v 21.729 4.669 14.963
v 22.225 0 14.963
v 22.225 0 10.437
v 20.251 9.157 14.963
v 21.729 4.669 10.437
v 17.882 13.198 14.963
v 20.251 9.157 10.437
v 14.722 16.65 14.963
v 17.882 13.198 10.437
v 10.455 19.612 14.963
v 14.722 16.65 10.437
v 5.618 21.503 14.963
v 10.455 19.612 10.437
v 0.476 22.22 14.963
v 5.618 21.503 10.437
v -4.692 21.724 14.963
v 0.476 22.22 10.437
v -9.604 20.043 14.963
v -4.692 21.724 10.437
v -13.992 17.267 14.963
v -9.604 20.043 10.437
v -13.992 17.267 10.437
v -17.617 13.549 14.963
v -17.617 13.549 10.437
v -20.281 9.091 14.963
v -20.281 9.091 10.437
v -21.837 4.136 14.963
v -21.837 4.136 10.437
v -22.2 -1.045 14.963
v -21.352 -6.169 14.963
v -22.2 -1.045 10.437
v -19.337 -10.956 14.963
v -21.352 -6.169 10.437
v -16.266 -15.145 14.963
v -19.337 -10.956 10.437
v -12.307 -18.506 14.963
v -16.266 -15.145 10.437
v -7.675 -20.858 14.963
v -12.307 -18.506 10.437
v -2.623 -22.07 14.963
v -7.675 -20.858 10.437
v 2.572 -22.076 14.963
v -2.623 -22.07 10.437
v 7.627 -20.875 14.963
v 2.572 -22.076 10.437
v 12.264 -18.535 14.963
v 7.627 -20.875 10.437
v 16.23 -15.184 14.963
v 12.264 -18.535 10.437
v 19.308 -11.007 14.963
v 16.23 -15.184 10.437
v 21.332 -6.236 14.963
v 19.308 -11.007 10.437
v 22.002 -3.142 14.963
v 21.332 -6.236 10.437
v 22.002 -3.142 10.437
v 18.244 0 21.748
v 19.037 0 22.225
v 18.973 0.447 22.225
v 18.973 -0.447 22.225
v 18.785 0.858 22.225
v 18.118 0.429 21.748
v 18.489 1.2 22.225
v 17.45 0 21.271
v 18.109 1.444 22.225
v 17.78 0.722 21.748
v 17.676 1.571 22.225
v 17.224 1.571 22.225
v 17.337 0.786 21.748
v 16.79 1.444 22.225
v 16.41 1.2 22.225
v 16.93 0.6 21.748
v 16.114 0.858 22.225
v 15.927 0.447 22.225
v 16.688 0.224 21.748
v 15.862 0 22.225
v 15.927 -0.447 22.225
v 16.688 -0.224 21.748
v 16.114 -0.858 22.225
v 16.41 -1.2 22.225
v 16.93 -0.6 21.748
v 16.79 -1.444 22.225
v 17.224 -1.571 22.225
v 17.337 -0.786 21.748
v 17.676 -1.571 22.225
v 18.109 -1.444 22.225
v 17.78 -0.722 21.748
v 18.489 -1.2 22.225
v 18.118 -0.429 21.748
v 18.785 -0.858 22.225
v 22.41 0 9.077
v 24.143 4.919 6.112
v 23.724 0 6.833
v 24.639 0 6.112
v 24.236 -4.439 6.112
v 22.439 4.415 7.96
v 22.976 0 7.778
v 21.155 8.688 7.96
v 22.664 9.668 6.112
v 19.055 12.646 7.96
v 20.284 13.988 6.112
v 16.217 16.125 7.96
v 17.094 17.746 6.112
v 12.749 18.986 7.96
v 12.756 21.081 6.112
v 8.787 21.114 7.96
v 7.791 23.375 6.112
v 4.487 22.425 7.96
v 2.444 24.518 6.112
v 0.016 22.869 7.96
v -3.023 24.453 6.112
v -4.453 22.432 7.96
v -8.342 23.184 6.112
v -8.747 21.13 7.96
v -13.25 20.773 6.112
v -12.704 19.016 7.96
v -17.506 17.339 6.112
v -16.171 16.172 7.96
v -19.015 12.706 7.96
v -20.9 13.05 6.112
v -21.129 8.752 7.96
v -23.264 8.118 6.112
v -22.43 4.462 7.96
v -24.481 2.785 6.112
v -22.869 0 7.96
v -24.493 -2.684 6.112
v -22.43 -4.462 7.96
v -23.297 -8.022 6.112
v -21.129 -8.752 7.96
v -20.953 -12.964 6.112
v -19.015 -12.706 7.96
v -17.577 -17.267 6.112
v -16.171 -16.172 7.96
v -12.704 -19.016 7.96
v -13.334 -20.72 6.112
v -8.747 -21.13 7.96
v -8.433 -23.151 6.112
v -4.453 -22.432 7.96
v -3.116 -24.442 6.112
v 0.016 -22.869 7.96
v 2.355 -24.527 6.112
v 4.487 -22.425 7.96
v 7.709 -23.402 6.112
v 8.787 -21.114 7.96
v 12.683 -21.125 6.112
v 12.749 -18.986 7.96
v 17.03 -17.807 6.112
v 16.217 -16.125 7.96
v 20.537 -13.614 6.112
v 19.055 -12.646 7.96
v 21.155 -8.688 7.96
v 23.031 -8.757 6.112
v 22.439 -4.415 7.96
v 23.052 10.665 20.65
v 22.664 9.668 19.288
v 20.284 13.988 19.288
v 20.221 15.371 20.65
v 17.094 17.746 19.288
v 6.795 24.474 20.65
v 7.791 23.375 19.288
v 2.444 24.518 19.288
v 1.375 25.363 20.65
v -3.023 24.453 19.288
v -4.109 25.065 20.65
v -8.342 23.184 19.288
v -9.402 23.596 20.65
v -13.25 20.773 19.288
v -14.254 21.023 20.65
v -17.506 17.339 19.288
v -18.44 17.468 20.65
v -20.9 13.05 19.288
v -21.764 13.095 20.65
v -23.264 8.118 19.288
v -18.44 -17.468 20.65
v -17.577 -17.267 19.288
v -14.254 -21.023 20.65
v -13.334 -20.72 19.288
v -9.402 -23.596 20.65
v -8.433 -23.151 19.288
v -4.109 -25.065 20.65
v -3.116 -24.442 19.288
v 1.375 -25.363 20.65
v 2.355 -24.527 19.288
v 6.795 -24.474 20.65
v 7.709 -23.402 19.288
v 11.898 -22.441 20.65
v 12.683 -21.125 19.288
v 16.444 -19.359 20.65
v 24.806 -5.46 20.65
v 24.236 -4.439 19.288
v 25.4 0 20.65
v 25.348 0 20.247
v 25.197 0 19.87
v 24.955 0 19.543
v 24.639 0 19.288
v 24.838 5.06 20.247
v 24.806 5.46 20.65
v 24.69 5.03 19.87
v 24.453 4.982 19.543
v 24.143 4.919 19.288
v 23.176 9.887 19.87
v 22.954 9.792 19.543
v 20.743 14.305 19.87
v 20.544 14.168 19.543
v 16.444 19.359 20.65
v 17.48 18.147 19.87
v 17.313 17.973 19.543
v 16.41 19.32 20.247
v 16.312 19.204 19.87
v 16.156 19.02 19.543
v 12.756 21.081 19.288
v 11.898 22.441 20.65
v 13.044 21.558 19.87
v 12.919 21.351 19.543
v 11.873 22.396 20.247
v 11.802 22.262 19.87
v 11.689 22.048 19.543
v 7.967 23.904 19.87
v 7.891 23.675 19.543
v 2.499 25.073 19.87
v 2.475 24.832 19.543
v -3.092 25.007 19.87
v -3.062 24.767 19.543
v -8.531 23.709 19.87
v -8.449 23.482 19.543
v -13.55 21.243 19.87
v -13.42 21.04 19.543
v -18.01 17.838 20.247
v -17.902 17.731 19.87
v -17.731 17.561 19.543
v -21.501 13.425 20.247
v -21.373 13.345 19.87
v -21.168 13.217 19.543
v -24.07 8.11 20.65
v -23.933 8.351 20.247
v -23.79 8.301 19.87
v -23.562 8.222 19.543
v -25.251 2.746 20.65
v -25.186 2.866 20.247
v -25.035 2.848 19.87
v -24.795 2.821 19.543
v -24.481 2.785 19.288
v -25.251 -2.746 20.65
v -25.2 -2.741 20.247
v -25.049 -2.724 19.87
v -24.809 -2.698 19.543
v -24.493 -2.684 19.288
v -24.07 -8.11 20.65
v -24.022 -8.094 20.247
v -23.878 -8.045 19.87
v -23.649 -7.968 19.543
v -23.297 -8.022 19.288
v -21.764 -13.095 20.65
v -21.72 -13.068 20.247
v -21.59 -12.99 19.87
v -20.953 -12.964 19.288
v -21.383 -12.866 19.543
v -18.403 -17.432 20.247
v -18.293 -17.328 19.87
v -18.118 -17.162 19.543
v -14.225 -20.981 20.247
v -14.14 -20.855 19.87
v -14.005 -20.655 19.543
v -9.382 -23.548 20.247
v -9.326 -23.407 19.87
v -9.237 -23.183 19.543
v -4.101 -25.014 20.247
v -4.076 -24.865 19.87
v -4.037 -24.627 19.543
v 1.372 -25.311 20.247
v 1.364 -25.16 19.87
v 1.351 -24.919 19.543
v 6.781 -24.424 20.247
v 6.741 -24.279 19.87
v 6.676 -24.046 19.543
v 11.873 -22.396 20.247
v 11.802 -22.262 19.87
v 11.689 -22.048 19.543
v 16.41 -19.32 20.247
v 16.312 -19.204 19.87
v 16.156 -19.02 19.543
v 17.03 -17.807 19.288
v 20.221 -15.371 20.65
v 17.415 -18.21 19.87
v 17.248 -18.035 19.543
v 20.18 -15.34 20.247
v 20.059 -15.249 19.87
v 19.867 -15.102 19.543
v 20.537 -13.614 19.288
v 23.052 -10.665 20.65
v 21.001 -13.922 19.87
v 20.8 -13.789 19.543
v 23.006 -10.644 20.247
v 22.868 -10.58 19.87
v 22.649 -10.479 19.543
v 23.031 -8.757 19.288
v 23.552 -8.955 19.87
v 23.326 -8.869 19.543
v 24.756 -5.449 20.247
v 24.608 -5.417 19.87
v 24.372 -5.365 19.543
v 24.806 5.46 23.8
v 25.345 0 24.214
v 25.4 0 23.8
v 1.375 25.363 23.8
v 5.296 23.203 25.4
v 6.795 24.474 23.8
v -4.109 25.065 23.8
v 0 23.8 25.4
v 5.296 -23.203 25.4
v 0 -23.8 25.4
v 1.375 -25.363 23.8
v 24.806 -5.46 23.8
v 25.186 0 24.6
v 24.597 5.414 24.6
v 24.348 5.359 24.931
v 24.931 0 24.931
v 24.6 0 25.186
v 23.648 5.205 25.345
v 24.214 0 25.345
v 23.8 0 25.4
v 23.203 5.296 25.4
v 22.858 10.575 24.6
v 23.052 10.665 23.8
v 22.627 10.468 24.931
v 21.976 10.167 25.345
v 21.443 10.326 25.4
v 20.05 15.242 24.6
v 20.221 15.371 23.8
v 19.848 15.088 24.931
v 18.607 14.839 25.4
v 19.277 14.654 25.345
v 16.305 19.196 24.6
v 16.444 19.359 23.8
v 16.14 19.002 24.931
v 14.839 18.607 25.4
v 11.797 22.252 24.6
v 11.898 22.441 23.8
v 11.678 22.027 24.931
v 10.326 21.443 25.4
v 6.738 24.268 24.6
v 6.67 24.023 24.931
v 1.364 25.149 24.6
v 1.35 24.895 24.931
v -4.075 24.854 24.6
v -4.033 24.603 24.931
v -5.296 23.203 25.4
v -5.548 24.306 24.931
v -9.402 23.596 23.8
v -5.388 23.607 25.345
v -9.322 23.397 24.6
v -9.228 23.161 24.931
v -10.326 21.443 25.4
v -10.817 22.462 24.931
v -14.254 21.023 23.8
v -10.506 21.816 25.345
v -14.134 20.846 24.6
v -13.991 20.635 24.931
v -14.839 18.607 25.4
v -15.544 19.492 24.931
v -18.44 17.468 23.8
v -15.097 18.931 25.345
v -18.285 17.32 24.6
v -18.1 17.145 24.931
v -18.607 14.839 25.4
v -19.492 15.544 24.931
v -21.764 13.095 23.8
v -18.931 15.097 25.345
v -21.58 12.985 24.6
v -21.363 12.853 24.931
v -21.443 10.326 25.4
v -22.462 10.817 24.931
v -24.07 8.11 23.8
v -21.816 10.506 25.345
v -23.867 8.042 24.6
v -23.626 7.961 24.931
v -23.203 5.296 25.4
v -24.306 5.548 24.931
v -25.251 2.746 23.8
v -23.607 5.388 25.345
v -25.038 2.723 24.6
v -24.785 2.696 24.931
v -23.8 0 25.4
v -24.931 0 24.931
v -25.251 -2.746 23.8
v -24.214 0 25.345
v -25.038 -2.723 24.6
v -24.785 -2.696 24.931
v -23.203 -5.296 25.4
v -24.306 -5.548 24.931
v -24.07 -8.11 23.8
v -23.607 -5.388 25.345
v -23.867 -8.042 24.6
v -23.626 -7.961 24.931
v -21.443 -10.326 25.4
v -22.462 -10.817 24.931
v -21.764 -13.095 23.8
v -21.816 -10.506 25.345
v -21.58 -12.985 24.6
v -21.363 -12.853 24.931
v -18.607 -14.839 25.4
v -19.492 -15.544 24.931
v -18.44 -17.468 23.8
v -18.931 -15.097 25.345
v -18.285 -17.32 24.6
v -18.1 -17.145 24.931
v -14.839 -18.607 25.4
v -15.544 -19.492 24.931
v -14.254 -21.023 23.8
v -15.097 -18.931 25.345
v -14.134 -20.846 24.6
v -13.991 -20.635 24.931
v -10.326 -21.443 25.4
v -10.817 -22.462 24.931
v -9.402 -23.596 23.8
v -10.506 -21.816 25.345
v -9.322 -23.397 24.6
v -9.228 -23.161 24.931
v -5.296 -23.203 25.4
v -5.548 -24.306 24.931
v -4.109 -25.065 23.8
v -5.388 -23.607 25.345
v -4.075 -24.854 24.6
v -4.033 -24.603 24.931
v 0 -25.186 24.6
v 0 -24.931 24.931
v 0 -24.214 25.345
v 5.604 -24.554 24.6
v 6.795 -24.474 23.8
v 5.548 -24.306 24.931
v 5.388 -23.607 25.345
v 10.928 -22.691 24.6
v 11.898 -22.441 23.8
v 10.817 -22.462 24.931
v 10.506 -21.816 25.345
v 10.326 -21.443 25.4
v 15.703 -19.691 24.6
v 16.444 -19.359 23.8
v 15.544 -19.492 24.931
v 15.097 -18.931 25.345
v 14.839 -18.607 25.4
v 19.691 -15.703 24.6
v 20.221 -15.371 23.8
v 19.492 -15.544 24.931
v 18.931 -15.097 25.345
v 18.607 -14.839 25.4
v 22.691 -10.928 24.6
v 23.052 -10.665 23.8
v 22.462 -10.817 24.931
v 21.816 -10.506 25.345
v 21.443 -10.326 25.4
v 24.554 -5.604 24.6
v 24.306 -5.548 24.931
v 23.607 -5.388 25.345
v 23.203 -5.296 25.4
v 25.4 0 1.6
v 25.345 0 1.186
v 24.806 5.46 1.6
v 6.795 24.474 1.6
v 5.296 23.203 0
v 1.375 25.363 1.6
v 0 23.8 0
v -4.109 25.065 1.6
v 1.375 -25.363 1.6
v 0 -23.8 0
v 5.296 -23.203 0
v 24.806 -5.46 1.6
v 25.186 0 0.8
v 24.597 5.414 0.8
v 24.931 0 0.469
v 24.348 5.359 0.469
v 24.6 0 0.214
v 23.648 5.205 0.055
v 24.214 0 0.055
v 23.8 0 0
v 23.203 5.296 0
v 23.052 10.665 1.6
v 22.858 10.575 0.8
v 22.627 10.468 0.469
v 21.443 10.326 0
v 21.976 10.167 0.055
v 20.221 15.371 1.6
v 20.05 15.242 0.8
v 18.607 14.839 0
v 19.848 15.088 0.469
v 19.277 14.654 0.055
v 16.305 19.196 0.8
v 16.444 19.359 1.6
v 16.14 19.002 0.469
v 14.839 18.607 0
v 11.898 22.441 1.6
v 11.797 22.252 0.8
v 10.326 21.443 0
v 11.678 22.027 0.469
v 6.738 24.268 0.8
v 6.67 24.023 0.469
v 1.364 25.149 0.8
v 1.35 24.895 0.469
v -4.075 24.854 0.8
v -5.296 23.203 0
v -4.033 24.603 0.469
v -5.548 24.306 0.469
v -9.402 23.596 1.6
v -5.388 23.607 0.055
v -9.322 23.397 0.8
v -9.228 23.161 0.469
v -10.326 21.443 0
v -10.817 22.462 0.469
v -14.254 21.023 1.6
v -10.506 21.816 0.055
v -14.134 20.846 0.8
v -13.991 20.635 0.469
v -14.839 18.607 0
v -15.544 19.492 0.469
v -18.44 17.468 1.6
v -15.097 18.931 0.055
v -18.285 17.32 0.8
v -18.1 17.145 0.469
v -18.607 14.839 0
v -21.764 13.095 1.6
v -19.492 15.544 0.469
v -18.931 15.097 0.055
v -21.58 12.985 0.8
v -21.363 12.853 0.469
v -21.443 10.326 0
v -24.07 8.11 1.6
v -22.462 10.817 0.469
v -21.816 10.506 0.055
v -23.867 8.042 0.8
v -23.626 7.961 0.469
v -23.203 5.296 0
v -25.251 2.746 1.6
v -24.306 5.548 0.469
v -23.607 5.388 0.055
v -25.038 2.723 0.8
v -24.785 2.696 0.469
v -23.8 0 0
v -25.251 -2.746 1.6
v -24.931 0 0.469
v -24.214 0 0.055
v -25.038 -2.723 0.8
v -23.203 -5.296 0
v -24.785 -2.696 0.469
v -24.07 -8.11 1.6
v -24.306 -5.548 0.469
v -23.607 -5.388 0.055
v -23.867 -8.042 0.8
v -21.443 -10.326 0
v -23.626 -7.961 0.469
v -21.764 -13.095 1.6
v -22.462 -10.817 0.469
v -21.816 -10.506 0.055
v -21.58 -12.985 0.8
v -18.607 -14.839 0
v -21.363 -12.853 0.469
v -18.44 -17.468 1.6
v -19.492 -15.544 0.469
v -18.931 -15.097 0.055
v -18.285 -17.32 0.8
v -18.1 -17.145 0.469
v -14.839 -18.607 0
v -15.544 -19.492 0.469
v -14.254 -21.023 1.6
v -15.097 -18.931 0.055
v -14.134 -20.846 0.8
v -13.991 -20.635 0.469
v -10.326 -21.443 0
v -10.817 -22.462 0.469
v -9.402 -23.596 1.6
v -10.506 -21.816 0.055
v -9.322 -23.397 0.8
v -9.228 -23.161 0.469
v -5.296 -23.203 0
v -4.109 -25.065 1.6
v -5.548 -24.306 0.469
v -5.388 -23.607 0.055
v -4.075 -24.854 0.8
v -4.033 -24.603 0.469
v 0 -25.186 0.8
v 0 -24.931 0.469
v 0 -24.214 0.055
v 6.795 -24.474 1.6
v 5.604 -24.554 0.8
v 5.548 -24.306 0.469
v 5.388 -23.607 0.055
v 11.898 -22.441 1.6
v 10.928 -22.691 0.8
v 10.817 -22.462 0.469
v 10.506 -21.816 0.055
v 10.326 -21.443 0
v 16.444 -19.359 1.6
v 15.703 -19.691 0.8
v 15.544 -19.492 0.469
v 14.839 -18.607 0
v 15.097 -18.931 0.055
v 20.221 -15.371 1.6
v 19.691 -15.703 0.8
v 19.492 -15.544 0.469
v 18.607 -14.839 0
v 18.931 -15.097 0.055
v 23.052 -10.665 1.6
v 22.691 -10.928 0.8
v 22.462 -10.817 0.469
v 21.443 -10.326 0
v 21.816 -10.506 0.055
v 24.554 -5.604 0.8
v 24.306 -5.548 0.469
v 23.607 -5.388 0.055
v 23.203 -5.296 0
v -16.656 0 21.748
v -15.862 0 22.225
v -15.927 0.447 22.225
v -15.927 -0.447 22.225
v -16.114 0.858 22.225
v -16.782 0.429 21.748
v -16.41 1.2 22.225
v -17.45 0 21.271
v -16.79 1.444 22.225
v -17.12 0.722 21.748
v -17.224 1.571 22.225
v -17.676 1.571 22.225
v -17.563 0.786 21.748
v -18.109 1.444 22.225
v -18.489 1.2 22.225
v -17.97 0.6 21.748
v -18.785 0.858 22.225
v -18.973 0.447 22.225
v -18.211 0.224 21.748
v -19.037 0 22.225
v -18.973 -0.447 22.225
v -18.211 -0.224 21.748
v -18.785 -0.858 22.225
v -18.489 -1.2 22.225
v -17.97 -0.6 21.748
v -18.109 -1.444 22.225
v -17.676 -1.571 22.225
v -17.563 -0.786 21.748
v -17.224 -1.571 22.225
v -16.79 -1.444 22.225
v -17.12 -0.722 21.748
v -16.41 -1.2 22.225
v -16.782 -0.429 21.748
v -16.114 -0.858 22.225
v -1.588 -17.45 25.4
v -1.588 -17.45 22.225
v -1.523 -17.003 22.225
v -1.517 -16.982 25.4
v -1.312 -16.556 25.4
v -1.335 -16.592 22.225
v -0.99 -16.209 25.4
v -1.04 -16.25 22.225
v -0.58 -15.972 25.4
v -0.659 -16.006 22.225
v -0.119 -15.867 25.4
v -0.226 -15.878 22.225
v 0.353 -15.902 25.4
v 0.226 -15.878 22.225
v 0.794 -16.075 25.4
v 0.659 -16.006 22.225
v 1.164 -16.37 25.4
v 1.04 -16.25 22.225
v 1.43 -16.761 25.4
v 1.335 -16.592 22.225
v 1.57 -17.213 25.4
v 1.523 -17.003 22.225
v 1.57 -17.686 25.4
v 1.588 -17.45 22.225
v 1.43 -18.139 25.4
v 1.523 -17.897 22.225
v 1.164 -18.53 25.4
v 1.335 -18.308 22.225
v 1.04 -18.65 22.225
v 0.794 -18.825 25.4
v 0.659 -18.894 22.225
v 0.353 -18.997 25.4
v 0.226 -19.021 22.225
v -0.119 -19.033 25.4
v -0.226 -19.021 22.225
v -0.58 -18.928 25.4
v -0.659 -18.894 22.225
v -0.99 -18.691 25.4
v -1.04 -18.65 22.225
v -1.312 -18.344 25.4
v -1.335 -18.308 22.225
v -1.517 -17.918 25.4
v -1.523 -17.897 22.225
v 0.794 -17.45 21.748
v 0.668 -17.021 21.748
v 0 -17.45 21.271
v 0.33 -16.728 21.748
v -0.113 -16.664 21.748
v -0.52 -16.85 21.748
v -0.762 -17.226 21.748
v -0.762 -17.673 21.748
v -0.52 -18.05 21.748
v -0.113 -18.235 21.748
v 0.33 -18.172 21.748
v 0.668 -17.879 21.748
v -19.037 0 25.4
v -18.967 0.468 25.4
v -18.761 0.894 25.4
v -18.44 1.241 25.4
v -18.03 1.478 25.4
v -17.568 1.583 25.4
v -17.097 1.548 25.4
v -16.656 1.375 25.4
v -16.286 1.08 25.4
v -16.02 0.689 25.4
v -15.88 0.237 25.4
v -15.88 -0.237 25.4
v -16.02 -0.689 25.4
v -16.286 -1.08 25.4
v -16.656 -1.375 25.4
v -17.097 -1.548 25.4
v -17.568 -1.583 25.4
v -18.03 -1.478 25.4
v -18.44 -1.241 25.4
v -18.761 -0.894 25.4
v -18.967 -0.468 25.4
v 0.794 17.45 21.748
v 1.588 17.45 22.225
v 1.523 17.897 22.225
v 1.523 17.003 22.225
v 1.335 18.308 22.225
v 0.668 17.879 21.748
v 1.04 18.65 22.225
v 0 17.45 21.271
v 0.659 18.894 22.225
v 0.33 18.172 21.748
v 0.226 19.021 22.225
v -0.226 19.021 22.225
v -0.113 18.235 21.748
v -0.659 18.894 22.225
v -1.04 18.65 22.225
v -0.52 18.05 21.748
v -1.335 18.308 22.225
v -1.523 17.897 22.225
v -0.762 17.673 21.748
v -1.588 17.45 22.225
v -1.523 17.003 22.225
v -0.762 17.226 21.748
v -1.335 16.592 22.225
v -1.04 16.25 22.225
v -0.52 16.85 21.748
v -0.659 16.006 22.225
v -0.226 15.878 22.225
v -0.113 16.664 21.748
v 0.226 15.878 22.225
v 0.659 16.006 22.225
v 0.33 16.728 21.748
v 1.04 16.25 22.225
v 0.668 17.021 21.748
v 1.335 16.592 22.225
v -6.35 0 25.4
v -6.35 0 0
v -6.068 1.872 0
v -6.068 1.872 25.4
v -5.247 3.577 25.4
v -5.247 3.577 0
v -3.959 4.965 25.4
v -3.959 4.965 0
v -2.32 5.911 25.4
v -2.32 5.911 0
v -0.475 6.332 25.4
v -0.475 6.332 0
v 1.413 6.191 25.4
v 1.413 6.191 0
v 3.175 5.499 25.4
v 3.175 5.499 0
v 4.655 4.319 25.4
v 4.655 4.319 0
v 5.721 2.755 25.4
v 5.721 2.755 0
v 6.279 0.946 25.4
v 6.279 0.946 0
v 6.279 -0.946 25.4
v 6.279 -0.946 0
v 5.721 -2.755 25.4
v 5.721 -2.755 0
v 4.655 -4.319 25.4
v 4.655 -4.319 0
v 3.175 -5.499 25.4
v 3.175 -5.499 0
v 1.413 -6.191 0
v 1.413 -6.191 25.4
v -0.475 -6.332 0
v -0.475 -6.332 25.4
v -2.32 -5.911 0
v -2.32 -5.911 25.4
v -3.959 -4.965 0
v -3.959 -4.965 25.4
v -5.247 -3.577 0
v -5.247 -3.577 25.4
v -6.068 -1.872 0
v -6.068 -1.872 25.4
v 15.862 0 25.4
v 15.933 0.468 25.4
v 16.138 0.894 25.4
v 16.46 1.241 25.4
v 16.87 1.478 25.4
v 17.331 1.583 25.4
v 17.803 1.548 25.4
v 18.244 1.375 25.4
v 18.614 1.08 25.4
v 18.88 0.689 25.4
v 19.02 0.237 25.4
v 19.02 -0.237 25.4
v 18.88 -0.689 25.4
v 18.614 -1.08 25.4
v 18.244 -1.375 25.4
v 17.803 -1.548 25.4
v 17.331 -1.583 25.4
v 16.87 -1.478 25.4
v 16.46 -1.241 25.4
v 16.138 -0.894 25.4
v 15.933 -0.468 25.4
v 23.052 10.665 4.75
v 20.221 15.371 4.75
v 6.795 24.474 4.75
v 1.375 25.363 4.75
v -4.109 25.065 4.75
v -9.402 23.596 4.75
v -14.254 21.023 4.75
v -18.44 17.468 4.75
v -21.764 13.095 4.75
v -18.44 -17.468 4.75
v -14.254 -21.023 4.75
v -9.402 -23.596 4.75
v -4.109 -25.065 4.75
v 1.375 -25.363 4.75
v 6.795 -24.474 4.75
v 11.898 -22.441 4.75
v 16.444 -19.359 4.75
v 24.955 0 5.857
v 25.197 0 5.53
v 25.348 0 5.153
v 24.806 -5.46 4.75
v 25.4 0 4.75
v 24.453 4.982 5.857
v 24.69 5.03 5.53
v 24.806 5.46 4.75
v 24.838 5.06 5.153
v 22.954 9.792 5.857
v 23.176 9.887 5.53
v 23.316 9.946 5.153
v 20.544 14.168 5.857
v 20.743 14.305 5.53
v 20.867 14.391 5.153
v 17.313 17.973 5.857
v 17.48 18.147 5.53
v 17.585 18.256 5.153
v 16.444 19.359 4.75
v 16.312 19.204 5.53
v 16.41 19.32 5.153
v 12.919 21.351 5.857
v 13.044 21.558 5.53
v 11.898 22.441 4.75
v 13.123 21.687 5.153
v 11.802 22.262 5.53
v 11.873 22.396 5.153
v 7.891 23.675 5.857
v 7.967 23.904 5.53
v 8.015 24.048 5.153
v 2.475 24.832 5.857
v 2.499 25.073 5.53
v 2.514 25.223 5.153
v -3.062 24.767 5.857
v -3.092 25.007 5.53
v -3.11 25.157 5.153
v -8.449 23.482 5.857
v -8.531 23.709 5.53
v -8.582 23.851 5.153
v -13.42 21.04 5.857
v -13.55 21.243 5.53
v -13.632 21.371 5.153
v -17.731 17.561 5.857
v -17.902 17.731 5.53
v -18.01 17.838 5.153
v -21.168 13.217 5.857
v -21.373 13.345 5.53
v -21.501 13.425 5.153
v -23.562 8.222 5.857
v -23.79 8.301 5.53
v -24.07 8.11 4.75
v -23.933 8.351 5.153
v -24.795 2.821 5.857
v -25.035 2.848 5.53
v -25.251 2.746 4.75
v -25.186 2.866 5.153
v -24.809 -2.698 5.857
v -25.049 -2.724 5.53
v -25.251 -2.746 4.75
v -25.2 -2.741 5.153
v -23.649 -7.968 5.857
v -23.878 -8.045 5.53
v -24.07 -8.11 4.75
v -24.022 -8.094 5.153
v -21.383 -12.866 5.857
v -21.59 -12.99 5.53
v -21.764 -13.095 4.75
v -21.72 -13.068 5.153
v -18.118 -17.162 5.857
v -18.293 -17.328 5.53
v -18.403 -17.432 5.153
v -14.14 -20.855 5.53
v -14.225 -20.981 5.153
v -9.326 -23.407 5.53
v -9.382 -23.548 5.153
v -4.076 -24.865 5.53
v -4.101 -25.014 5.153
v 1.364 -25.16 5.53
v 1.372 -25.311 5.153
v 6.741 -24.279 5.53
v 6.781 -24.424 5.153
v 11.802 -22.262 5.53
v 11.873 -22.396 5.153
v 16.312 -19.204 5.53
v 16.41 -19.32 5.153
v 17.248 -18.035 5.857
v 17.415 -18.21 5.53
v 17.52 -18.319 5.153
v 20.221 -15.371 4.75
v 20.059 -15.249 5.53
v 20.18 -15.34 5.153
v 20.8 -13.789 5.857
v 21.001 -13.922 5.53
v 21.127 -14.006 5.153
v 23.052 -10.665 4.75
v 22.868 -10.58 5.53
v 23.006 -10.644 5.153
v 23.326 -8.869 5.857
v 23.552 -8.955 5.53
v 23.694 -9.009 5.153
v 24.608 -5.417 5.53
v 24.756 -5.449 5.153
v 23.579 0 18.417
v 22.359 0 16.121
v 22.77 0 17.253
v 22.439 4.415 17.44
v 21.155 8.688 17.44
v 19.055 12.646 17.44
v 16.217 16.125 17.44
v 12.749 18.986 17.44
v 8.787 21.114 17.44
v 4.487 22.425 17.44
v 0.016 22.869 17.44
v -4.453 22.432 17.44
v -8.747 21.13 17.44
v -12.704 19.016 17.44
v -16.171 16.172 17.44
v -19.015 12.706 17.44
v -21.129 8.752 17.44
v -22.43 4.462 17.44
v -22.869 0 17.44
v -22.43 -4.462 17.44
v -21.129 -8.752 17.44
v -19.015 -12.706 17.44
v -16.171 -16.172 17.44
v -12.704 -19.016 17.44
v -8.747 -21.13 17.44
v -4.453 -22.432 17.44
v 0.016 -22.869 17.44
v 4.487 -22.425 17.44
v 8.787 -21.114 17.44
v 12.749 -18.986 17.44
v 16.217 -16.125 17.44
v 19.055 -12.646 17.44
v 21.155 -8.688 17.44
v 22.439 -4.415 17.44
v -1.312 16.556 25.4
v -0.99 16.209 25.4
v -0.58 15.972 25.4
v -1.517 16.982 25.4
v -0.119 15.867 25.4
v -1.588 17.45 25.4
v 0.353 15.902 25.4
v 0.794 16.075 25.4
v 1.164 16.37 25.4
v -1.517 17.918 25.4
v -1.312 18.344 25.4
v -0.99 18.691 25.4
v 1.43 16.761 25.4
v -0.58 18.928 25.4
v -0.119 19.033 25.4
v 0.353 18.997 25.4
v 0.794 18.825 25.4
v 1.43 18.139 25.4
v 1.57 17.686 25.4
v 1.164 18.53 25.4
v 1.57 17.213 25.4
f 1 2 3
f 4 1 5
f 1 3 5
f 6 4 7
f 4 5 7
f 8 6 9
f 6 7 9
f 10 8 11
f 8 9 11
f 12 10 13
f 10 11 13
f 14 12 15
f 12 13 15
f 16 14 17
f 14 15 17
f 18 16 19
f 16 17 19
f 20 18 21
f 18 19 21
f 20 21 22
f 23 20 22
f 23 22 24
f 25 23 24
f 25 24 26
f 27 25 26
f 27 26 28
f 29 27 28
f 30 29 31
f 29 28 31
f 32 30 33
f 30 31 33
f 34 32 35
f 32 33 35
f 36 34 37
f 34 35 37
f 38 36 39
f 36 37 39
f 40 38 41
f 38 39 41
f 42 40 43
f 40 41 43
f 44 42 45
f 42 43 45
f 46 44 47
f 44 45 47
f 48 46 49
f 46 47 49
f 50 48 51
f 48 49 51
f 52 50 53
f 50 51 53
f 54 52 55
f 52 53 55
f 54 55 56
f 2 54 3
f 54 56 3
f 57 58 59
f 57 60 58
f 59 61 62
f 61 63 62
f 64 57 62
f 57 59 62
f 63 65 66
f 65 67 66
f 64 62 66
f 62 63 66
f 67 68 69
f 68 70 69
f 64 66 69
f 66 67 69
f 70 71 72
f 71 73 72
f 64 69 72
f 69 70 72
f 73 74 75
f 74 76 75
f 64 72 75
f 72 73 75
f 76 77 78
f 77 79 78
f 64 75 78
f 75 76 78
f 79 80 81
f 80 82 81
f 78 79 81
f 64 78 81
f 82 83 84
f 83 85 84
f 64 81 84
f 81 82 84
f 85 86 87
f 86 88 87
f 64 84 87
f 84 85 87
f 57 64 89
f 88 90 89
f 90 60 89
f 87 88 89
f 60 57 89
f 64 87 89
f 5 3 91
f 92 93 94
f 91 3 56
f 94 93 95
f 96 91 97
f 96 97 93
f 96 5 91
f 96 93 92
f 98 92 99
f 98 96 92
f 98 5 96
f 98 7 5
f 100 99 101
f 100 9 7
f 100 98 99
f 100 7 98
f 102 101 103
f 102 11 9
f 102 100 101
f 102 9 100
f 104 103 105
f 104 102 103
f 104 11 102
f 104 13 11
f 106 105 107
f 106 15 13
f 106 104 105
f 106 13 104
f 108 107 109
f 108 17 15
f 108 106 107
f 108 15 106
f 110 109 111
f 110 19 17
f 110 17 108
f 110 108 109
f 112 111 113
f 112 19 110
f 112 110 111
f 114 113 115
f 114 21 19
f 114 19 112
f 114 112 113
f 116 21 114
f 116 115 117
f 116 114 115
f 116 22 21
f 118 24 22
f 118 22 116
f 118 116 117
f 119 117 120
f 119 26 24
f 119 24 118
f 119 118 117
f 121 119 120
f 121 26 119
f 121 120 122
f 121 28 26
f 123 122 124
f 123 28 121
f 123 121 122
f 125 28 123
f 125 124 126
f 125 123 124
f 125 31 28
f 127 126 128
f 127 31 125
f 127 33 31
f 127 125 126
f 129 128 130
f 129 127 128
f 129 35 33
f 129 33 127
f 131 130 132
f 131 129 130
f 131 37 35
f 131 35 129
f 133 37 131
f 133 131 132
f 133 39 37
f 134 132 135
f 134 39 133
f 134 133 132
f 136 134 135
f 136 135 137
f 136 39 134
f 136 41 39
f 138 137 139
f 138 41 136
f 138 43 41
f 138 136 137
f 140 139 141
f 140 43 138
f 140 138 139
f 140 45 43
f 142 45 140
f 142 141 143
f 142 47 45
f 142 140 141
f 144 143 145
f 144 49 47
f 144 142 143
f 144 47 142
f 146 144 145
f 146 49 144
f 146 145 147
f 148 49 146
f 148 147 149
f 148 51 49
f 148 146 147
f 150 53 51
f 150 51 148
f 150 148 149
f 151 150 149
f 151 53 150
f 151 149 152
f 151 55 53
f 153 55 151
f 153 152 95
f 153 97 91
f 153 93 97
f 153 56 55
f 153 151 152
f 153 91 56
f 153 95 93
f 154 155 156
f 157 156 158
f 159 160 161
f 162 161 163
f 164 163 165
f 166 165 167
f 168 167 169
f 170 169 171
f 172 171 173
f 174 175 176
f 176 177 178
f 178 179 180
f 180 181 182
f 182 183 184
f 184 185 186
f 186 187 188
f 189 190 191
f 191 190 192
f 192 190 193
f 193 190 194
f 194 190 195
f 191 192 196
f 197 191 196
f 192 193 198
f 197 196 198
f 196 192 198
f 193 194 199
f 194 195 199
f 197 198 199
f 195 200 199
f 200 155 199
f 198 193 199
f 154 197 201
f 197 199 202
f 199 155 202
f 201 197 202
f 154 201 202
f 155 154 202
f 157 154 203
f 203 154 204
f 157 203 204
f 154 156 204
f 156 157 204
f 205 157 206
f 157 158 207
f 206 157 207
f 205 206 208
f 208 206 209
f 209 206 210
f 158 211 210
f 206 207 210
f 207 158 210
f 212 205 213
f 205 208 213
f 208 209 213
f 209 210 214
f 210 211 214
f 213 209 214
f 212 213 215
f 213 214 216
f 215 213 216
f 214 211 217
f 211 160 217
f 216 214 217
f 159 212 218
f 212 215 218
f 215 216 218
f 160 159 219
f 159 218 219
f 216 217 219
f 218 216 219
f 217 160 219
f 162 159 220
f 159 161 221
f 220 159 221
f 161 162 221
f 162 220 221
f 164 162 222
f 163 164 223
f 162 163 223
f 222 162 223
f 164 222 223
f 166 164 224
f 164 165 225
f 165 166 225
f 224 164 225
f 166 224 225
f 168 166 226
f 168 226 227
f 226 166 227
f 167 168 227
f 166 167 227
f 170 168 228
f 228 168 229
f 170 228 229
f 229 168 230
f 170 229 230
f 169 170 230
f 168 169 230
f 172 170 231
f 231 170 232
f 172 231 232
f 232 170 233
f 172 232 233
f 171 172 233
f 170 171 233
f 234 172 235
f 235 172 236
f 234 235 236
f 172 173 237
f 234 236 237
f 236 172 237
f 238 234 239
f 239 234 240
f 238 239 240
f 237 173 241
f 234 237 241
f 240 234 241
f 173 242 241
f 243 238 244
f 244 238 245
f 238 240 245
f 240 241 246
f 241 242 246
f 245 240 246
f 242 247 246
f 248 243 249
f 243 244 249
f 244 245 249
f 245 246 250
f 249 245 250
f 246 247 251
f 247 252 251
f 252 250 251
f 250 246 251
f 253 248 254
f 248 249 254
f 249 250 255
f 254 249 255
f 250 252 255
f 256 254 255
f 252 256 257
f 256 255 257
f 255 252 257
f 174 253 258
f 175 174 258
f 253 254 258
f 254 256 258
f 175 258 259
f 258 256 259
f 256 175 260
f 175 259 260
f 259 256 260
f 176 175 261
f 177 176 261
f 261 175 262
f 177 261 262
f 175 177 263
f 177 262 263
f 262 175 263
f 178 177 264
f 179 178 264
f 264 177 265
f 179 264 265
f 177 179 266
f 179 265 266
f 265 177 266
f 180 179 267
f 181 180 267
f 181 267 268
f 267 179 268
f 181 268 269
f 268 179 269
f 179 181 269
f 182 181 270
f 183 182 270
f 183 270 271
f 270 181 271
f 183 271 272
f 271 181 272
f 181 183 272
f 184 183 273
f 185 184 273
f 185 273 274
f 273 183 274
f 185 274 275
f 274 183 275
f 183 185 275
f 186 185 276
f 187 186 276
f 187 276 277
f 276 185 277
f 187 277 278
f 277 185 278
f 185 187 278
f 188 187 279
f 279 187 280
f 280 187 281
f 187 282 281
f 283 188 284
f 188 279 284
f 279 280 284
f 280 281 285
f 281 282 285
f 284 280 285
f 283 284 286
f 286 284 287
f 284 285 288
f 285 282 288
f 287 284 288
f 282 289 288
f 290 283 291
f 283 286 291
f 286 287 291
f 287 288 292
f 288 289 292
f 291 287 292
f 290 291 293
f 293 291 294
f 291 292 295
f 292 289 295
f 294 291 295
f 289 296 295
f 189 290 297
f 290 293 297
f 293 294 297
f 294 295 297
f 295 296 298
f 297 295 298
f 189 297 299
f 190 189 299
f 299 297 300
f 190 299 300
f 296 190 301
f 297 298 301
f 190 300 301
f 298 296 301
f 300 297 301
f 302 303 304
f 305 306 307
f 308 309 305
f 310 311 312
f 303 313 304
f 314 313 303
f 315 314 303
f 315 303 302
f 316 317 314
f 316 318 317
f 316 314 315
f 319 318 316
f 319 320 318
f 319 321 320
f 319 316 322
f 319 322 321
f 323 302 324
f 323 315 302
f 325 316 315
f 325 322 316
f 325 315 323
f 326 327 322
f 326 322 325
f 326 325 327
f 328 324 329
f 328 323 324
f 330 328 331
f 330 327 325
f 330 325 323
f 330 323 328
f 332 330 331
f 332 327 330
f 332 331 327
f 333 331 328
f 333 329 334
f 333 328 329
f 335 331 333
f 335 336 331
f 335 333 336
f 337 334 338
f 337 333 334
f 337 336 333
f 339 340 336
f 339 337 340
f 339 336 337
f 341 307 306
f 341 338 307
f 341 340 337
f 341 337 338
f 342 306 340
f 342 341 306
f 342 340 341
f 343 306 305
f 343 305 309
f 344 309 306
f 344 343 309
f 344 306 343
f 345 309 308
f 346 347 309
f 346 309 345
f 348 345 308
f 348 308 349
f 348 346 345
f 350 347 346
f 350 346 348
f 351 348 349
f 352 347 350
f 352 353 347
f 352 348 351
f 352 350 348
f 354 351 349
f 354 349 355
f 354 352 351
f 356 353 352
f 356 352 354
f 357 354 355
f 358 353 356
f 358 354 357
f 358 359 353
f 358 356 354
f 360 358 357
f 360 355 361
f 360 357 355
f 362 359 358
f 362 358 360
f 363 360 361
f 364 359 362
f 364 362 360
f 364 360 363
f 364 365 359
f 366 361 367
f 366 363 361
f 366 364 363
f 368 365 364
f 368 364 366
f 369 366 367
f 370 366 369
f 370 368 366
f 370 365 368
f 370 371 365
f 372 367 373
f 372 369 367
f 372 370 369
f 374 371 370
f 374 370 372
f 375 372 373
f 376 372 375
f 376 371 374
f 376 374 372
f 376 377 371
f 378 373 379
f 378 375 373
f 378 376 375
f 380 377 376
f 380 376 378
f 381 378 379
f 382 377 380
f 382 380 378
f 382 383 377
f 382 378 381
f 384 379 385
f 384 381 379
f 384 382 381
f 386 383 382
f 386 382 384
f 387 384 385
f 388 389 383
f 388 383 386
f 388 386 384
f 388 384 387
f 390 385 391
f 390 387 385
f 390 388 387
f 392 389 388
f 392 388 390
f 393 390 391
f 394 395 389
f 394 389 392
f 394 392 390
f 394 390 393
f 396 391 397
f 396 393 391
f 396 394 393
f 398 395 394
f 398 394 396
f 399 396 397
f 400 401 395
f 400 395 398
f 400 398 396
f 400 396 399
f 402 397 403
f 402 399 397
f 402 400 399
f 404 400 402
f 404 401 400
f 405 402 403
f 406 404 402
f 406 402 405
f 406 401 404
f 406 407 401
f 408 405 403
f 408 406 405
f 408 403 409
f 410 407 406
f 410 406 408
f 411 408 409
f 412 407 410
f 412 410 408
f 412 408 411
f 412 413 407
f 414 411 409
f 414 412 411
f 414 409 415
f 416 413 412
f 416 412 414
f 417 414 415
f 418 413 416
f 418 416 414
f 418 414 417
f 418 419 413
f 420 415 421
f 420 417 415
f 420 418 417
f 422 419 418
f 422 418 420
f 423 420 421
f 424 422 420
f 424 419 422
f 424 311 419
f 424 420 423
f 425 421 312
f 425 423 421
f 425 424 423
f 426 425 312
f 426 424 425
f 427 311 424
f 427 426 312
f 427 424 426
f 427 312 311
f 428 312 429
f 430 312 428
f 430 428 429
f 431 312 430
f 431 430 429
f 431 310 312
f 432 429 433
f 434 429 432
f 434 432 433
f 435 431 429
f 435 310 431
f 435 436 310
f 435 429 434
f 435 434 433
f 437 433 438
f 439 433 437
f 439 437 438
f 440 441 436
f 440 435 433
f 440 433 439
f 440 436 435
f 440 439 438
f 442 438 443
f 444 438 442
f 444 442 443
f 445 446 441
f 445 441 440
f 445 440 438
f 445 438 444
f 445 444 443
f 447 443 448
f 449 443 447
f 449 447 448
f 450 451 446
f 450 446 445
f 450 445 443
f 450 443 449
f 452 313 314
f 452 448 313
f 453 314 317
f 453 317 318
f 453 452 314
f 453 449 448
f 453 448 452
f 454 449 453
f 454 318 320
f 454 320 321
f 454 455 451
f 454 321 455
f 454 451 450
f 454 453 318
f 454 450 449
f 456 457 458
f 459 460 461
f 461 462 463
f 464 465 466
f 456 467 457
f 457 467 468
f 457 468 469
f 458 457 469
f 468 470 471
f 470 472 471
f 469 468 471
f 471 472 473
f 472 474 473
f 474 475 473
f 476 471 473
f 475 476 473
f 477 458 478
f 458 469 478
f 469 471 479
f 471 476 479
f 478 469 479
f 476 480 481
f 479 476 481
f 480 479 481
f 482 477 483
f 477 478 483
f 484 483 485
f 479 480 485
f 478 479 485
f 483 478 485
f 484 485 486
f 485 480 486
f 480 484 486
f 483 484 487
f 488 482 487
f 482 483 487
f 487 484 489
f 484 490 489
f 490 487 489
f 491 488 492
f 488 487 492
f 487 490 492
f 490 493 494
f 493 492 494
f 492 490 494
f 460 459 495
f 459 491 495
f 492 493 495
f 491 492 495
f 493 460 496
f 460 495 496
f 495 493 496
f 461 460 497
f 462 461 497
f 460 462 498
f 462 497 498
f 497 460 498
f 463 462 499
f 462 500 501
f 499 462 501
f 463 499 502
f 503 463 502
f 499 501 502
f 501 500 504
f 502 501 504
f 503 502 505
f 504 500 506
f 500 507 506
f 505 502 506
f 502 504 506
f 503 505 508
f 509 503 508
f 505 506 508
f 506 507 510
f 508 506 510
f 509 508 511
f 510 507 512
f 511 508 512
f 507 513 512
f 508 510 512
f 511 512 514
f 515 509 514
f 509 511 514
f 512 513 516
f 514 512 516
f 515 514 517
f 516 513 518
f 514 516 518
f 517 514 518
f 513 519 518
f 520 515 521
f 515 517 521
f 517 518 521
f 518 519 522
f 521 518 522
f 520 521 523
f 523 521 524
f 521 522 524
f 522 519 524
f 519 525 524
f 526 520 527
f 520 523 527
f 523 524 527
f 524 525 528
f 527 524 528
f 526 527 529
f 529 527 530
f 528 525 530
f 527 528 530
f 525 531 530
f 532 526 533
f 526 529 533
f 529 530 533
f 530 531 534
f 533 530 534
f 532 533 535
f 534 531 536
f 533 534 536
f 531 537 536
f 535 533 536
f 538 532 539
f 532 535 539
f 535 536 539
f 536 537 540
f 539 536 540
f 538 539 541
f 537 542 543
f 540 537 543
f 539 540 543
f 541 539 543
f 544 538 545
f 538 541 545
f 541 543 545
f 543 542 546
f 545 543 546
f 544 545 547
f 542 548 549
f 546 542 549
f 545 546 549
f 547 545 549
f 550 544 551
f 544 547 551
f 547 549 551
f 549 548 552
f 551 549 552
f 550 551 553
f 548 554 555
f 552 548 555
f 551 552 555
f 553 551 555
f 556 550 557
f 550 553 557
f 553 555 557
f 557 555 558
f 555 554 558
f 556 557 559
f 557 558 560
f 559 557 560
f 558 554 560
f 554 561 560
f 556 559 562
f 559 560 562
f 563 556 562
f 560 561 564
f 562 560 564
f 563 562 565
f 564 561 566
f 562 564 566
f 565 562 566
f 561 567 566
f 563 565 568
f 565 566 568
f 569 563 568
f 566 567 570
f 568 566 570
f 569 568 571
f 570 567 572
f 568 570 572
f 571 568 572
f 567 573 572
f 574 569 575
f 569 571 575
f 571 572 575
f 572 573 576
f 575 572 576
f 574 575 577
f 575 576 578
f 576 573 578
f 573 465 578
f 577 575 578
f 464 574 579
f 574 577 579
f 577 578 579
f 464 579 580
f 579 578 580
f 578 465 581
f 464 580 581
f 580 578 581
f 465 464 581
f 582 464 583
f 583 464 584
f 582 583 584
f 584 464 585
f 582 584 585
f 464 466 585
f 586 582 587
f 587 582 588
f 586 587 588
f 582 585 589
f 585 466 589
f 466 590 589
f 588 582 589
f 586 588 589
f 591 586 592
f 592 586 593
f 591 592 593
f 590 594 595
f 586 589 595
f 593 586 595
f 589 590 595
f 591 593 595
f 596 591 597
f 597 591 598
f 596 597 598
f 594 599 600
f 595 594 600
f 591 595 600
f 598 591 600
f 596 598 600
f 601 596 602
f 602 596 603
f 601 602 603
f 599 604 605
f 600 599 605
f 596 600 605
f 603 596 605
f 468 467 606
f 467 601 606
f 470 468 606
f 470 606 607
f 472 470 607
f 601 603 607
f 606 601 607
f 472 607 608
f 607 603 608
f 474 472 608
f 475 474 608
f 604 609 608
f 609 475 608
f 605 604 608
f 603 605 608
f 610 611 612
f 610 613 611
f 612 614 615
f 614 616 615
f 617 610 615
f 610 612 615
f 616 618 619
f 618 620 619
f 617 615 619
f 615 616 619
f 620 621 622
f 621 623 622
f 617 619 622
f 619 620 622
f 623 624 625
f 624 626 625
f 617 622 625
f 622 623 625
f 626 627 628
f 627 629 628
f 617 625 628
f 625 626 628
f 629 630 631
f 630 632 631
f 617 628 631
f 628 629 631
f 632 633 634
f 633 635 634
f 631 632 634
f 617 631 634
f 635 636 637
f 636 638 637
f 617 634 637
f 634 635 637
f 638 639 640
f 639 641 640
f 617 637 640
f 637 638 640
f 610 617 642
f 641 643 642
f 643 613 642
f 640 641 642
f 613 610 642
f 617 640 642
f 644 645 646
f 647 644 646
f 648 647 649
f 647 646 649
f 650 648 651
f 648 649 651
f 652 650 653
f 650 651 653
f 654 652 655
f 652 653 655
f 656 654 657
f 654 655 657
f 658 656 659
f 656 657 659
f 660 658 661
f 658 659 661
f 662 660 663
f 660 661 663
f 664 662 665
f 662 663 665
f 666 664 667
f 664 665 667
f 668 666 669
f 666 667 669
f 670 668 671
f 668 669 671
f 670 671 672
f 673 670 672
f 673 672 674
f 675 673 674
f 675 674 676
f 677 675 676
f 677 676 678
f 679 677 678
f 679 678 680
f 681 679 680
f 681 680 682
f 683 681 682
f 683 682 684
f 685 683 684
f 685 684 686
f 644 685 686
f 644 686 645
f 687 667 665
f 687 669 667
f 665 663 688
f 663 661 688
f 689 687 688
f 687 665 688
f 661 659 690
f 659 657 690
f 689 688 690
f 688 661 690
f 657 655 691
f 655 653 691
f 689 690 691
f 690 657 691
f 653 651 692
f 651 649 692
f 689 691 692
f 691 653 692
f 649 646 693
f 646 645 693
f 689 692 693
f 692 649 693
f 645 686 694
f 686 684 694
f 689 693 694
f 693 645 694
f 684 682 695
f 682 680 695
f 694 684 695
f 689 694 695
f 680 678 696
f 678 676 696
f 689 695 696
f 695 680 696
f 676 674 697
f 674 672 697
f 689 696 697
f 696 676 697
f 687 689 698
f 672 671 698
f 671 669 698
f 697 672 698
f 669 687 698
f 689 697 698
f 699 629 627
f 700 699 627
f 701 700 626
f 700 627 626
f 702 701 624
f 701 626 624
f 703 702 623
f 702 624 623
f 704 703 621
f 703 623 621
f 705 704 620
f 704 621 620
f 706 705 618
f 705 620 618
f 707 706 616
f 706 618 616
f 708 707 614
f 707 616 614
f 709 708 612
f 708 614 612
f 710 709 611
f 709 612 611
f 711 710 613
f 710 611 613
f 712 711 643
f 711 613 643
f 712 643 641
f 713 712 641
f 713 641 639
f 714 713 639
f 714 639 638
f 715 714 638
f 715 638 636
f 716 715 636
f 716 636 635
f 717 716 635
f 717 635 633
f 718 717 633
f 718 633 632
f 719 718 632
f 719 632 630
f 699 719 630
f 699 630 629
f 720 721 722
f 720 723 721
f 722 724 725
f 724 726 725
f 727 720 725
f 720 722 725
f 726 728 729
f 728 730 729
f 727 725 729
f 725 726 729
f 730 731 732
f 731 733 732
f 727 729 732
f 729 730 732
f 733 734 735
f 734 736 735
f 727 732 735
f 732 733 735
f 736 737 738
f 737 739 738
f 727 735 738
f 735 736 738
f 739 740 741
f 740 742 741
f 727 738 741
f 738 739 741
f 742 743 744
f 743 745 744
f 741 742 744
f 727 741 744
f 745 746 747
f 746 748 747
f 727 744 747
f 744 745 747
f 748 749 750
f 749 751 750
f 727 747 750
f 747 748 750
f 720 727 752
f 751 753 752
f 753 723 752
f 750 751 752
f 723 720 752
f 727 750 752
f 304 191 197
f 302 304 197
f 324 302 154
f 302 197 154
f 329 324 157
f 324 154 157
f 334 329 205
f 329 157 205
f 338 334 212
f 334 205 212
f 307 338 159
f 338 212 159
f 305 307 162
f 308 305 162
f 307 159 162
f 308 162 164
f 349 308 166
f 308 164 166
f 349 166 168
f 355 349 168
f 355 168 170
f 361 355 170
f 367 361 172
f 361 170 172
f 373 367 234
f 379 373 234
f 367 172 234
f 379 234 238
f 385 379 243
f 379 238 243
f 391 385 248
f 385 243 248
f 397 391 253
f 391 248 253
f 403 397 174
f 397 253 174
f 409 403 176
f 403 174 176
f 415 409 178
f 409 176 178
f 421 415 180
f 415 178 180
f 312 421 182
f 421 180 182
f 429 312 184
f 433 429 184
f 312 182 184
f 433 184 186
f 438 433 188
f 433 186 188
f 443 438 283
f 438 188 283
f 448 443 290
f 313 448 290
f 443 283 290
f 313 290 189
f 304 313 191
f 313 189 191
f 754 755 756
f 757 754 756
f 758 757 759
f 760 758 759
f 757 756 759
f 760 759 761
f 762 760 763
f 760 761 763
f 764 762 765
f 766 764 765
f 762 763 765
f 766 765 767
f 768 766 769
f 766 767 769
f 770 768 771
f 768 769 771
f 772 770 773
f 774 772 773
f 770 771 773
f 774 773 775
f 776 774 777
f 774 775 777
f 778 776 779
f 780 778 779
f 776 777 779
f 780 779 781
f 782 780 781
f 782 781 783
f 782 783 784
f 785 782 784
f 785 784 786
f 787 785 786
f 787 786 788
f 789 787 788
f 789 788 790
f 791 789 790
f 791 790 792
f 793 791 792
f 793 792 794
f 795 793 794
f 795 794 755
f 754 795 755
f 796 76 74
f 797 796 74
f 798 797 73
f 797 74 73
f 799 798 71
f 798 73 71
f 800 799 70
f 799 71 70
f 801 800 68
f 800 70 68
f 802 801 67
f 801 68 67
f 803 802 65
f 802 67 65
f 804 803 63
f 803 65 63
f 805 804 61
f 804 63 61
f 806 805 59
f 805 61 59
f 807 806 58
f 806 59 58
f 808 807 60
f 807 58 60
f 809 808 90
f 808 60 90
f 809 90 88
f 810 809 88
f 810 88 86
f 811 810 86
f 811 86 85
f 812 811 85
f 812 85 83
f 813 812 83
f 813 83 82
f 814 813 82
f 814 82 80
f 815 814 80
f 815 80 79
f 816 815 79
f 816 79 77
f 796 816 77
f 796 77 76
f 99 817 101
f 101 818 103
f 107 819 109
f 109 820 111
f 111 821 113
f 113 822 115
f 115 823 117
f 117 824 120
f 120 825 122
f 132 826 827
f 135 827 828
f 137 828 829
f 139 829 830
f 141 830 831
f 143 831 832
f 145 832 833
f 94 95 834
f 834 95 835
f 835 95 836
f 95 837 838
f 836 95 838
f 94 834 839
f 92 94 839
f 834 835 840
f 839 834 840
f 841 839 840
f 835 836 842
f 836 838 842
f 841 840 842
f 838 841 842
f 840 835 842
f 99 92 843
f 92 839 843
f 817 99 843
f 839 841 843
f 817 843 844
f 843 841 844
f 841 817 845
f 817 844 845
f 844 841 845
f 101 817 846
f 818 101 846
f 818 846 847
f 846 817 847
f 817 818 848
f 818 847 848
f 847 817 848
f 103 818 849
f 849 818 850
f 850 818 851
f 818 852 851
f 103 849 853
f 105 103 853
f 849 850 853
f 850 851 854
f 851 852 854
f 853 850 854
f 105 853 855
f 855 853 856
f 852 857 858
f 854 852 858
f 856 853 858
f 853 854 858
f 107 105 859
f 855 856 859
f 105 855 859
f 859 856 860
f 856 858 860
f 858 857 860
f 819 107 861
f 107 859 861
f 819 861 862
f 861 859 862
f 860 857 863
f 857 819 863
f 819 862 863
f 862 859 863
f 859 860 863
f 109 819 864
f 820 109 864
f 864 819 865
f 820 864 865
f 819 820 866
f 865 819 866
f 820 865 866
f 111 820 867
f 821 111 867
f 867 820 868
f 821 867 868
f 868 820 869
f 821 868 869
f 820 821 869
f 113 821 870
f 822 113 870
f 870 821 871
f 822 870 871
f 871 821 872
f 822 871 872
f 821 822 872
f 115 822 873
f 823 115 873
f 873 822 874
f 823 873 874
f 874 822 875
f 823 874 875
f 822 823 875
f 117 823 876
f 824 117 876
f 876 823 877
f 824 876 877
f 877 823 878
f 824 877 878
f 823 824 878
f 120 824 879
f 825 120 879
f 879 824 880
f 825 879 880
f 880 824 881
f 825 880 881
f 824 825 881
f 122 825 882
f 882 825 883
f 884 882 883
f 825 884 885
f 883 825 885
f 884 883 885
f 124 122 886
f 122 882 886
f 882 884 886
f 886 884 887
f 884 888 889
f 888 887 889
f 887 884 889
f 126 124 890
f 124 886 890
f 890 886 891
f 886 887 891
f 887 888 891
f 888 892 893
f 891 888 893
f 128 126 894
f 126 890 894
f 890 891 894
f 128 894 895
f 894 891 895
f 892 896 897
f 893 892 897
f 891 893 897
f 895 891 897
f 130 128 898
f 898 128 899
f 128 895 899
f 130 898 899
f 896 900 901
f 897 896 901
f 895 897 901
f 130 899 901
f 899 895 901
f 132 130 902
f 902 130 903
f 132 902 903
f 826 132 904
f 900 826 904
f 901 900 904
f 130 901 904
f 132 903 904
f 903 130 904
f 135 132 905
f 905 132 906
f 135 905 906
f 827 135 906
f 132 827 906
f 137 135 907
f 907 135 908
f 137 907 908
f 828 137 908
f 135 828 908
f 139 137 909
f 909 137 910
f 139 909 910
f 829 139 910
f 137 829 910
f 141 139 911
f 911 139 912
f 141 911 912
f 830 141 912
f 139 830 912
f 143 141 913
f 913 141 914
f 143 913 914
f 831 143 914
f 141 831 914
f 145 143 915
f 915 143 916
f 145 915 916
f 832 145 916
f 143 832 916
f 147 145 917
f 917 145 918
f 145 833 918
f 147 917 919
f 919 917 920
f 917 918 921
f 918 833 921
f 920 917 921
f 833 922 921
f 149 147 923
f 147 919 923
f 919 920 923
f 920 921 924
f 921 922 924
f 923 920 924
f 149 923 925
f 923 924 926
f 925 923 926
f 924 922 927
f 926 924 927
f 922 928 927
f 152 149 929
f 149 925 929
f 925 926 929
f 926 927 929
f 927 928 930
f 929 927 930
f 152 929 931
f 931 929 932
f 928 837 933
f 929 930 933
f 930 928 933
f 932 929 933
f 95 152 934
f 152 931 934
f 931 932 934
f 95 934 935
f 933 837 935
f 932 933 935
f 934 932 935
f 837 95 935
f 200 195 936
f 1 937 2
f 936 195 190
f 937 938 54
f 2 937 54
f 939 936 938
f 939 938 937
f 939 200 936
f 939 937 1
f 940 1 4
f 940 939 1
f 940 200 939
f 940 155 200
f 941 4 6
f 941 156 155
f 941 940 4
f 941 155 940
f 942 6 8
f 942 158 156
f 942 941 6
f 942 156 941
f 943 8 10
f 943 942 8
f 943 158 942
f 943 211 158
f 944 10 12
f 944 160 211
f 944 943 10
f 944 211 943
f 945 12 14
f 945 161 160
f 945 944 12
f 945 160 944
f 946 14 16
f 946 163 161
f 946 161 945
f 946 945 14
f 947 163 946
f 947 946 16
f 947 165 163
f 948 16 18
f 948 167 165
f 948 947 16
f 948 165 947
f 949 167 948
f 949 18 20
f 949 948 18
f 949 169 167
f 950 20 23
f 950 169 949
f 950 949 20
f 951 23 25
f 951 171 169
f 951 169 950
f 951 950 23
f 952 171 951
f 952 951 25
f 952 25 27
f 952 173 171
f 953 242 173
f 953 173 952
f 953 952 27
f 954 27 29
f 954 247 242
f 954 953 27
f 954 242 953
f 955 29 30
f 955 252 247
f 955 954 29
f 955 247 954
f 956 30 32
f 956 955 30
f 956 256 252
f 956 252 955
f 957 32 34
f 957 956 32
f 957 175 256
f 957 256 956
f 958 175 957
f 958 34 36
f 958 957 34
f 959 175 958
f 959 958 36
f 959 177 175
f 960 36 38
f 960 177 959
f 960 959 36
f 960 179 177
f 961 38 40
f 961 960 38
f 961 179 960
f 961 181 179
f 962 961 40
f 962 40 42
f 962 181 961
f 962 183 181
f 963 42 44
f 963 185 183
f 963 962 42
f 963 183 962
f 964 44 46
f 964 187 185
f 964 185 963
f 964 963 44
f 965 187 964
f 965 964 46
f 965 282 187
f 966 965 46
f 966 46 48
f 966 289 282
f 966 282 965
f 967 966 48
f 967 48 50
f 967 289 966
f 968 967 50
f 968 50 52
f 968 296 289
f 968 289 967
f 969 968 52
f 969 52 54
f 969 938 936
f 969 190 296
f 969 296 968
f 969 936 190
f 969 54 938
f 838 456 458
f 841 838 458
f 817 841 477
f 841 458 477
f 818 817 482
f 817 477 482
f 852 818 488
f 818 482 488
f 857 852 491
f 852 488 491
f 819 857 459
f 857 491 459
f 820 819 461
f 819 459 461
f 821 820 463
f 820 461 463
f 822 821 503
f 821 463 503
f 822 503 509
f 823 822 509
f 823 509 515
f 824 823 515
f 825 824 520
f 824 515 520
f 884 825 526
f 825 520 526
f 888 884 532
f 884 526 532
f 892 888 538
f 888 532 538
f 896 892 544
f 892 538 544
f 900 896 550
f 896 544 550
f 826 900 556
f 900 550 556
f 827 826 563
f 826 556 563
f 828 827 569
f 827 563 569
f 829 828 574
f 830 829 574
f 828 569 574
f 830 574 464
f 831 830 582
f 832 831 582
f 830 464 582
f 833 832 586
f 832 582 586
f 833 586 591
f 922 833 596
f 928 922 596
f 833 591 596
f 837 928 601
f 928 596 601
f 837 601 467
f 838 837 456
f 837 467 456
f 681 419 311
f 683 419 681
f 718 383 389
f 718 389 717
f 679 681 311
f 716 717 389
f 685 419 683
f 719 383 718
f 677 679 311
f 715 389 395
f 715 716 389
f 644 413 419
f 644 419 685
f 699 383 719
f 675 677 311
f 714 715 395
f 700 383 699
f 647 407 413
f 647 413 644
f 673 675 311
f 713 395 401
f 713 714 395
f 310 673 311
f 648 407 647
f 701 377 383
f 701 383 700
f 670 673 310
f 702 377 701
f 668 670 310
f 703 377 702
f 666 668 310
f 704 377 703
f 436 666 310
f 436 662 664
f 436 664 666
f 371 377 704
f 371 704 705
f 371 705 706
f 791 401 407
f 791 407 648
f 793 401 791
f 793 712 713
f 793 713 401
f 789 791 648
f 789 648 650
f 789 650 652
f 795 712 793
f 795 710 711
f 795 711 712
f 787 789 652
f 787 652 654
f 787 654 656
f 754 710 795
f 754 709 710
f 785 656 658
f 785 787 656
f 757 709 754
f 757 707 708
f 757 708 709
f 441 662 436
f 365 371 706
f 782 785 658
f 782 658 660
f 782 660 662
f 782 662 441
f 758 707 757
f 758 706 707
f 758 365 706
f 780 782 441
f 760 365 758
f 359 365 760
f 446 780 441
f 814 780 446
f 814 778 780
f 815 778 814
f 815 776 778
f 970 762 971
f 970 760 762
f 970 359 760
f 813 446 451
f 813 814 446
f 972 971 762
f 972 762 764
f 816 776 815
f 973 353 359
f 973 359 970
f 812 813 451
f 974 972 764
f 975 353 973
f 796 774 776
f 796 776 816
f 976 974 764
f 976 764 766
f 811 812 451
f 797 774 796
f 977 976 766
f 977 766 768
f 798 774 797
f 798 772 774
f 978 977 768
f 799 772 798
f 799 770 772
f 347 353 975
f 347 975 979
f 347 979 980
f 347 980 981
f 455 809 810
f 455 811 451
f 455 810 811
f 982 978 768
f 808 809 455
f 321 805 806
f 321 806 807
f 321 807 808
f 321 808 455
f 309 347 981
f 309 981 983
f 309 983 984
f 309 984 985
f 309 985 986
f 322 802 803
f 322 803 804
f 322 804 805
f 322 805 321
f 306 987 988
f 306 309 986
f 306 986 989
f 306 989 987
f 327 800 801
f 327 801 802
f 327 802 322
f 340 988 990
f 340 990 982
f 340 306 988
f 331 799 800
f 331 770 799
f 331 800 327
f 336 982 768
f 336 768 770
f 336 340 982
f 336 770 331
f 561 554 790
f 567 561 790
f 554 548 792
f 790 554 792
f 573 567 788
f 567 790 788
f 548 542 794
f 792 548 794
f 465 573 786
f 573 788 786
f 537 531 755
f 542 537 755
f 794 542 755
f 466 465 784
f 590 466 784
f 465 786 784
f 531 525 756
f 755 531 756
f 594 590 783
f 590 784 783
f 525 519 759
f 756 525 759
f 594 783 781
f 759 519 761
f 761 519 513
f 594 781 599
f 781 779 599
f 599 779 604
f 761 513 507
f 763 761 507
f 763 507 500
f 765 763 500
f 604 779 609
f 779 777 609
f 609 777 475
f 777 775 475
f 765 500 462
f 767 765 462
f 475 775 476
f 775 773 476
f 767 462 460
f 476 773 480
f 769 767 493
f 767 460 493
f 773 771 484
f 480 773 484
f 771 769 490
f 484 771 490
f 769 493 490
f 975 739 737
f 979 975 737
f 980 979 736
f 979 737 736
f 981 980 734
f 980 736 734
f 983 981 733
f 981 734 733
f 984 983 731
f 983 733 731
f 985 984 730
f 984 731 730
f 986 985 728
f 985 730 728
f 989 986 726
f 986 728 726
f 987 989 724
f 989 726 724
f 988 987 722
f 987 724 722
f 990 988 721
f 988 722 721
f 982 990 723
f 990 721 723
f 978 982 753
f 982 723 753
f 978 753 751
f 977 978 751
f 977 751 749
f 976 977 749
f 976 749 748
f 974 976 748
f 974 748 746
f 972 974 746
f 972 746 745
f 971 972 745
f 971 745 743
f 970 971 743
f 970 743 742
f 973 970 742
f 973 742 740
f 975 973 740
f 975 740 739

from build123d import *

# Parameters (mm, degrees)
F0_R           = 25.4
F1_DEPTH       = 6.35
F2_R           = 22.225
F3_DEPTH       = 12.7
F4_R           = 25.4
F5_DEPTH       = 6.35
F6_R           = 1.6002
F7_R           = 5.08
F9_D           = 3.175
F9_DEPTH       = 3.175
F9_CBORE_D     = 3.175
F9_CBORE_DEPTH = 3.175
F9_TIP         = 0.9538662327
F10_D          = 12.7


with BuildPart() as f1:
    # F0 (on Top) → F1 (new body)
    with BuildSketch(Plane.XY):
        Circle(F0_R)
    extrude(amount=F1_DEPTH)

    # F2 (on face) → F3 (join)
    with BuildSketch(Plane.XY.offset(6.35)):
        Circle(F2_R)
    extrude(amount=F3_DEPTH)

    # F4 (on face) → F5 (join)
    with BuildSketch(Plane.XY.offset(19.05)):
        Circle(F4_R)
    extrude(amount=F5_DEPTH)

    # F6
    f6_edges = [f1.edges().sort_by_distance(p)[0] for p in [
        (-25.4, 0, 6.35),
        (-25.4, 0, 19.05),
        (25.4, 0, 3.175),
        (-25.4, 0, 0),
        (-25.4, 0, 25.4),
    ]]
    fillet(f6_edges, radius=F6_R)

    # F7
    f7_edges = [f1.edges().sort_by_distance(p)[0] for p in [
        (22.225, 0, 12.7),
        (-22.225, 0, 6.35),
        (-22.225, 0, 19.05),
    ]]
    fillet(f7_edges, radius=F7_R)

    # F9
    with Locations(Plane.XY.offset(25.4)):
        with Locations((0, -17.4498), (-17.4498, 0), (0, 17.4498), (17.4498, 0)):
            CounterBoreHole(F9_D / 2, F9_CBORE_D / 2, F9_CBORE_DEPTH, depth=F9_DEPTH)
            with Locations((0, 0, -(F9_DEPTH + F9_TIP / 2))):  # 118° drill point
                Cone(0, F9_D / 2, F9_TIP, mode=Mode.SUBTRACT)

    # F10 (through all)
    with Locations(Plane.XY.offset(25.4)):
        with Locations((0, 0)):
            Hole(F10_D / 2)


solid = f1.part
